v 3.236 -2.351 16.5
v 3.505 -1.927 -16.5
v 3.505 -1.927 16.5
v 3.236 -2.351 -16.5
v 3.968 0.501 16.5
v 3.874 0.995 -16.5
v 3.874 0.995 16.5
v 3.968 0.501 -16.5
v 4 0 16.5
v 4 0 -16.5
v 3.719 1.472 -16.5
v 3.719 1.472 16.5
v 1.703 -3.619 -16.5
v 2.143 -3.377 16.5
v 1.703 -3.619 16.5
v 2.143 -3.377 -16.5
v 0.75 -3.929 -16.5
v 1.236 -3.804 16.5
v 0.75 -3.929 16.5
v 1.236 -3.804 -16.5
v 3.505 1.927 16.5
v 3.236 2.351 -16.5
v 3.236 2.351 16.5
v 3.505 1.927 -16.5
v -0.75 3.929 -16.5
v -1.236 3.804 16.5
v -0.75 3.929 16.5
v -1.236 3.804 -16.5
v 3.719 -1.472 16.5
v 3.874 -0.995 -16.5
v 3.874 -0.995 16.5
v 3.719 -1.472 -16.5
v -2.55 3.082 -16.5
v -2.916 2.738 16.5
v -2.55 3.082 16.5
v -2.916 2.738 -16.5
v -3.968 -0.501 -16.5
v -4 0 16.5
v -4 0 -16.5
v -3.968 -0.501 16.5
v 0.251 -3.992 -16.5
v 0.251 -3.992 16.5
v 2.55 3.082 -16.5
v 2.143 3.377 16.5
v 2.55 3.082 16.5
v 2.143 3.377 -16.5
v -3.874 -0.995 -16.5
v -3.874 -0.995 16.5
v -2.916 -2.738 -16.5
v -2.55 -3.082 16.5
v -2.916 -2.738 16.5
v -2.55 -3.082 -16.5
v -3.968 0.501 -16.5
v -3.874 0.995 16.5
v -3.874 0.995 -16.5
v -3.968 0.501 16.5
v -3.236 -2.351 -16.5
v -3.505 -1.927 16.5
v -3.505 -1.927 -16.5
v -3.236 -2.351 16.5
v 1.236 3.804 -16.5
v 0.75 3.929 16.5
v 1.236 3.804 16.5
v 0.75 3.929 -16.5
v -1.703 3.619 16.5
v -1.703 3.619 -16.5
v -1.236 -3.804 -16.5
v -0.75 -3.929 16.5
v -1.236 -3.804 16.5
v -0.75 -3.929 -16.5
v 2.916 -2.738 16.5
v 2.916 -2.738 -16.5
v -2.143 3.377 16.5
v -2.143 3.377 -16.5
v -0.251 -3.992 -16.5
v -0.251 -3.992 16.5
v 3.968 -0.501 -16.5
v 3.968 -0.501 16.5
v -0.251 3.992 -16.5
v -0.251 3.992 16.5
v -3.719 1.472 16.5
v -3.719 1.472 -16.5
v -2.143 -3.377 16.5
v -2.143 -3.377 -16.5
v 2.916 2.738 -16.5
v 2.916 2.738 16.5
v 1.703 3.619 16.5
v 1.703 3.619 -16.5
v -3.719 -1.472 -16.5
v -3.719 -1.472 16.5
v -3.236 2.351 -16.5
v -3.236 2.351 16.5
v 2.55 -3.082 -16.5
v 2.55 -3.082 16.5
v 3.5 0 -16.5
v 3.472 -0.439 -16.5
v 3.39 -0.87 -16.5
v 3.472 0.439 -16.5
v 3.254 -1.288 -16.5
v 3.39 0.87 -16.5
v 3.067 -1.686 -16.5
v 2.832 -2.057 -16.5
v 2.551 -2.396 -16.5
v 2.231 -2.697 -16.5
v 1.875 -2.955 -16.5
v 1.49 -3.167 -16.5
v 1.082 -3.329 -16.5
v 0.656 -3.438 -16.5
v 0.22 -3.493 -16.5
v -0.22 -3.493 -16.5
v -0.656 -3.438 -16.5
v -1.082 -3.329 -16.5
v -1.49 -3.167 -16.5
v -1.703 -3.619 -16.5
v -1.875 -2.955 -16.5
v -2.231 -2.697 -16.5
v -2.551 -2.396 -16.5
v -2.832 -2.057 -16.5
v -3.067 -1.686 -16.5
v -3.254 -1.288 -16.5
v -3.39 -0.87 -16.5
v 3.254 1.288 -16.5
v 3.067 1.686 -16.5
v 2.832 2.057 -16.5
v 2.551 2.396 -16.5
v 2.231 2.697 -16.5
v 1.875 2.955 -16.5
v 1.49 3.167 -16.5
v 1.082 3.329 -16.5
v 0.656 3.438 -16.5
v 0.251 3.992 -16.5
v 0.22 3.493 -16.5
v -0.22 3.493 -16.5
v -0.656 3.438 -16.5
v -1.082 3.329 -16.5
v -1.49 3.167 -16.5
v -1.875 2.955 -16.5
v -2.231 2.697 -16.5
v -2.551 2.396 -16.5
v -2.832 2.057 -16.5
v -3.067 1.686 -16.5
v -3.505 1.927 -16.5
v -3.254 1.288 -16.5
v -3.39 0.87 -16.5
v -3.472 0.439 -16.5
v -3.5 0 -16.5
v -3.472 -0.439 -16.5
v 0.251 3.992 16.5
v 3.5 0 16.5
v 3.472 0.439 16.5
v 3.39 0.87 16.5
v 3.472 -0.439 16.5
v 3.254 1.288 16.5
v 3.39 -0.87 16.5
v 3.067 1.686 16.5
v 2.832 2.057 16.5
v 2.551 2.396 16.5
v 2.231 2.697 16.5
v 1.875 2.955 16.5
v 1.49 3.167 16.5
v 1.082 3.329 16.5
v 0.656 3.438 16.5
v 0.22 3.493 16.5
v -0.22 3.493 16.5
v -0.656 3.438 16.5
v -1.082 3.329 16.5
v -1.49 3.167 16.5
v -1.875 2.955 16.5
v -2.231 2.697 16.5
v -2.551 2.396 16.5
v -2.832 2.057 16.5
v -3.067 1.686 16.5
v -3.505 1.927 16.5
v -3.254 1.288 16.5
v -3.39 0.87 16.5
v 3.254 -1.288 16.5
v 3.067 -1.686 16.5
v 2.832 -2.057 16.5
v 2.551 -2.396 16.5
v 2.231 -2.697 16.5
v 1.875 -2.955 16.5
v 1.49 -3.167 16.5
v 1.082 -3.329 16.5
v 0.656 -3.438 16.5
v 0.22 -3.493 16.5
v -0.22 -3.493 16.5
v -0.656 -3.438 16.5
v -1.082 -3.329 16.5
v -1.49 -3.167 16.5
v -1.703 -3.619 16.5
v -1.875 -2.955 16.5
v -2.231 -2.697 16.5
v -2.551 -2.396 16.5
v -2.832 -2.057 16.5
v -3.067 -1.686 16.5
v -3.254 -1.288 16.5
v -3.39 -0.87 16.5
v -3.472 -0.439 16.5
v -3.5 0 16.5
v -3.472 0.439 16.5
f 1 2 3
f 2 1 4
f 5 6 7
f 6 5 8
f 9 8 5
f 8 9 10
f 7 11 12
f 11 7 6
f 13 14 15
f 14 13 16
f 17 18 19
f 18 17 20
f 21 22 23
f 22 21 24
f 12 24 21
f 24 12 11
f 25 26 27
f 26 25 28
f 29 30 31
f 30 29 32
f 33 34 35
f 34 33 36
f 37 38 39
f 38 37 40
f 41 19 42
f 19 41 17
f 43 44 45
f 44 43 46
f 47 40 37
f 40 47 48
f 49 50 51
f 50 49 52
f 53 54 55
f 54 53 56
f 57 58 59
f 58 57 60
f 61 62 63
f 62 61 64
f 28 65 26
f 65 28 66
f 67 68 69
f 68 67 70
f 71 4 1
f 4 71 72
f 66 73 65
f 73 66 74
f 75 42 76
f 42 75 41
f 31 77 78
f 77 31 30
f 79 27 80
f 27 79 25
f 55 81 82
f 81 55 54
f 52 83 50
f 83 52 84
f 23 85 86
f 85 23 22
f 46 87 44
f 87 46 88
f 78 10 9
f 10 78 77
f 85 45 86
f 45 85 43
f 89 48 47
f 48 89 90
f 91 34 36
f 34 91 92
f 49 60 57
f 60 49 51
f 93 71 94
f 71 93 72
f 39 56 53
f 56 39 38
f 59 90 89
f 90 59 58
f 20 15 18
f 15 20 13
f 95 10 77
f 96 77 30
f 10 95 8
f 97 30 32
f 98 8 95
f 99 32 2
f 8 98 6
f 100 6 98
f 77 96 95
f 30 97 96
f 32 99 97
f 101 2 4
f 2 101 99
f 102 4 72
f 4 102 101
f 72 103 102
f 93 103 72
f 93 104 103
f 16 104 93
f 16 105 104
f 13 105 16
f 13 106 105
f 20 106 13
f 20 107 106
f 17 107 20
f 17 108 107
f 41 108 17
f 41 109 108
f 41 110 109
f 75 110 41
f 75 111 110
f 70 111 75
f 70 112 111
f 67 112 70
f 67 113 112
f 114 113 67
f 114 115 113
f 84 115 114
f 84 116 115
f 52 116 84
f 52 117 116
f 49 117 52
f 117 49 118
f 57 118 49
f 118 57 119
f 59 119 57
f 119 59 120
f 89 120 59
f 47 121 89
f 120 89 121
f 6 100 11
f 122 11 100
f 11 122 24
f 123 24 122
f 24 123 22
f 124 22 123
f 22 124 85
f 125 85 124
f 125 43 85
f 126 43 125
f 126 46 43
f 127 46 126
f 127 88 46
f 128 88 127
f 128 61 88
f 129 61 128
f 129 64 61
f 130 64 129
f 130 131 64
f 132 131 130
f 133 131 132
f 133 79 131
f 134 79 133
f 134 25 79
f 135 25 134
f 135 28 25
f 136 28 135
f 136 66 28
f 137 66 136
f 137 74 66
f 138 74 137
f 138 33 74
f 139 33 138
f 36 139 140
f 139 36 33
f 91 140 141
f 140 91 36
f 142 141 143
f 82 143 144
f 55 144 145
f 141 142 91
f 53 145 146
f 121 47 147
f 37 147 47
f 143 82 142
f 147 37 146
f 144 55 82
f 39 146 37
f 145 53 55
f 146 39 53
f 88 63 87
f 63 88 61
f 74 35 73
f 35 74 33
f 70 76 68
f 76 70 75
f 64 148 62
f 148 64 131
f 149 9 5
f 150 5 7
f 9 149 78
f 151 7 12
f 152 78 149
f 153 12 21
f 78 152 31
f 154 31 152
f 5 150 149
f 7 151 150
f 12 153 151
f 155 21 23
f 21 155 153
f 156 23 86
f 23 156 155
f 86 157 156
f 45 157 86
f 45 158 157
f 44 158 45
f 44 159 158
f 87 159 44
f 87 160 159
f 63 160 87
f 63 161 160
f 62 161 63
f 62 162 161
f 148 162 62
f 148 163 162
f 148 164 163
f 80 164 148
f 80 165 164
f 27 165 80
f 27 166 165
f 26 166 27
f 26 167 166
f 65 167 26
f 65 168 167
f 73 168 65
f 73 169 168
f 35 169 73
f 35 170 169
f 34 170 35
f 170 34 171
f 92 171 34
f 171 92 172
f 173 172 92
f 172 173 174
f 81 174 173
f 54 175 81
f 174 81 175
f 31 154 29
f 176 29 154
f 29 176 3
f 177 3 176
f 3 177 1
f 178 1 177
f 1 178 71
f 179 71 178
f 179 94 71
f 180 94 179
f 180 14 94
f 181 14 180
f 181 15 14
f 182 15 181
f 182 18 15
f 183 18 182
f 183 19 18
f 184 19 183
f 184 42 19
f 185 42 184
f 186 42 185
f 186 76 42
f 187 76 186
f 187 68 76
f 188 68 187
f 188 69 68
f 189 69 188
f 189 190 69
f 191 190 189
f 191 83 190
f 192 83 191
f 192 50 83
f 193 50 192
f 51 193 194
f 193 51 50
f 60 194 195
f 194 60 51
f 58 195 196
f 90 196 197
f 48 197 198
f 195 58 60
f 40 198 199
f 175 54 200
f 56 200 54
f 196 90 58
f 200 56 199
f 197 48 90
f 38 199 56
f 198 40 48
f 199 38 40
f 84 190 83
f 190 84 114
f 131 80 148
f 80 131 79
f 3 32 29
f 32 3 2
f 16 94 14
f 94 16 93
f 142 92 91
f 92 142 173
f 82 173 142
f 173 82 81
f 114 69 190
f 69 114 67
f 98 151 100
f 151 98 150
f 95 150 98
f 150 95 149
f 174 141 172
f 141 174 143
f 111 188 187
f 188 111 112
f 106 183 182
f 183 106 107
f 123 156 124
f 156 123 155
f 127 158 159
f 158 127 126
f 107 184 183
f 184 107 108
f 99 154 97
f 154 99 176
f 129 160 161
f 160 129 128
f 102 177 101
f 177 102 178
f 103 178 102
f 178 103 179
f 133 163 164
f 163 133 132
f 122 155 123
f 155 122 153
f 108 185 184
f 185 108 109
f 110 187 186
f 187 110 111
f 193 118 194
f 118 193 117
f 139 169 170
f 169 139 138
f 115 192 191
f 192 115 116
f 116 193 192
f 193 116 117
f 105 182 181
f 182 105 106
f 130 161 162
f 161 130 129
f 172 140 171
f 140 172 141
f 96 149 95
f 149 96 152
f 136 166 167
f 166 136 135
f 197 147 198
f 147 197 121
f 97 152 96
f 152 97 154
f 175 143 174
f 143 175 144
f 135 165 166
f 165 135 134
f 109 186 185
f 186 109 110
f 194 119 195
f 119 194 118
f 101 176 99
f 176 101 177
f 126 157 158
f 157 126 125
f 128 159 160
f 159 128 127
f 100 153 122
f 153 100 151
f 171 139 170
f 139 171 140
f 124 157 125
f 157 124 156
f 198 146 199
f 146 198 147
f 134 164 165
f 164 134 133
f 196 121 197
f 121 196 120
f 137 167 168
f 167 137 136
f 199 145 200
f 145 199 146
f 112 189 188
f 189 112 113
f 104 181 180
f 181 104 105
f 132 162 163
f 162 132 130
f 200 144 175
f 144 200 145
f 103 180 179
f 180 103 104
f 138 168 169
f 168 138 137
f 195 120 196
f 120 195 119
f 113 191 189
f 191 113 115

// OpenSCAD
$fn = 50;


difference() {
	union() {
		translate(v = [0, 0, -16.5000000000]) {
			cylinder(h = 33, r = 4.0000000000);
		}
	}
	union() {
		translate(v = [0, 0, -100.0000000000]) {
			cylinder(h = 200, r = 3.5000000000);
		}
	}
}
